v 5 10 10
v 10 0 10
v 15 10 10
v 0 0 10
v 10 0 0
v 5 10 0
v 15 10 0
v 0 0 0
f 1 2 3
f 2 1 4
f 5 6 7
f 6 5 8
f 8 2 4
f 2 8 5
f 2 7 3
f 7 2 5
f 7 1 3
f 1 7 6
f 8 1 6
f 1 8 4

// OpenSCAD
multmatrix(m=[[1,0.5,0,0],[0,1,0,0],[0,0,1,0],[0,0,0,1]]) cube(10);
